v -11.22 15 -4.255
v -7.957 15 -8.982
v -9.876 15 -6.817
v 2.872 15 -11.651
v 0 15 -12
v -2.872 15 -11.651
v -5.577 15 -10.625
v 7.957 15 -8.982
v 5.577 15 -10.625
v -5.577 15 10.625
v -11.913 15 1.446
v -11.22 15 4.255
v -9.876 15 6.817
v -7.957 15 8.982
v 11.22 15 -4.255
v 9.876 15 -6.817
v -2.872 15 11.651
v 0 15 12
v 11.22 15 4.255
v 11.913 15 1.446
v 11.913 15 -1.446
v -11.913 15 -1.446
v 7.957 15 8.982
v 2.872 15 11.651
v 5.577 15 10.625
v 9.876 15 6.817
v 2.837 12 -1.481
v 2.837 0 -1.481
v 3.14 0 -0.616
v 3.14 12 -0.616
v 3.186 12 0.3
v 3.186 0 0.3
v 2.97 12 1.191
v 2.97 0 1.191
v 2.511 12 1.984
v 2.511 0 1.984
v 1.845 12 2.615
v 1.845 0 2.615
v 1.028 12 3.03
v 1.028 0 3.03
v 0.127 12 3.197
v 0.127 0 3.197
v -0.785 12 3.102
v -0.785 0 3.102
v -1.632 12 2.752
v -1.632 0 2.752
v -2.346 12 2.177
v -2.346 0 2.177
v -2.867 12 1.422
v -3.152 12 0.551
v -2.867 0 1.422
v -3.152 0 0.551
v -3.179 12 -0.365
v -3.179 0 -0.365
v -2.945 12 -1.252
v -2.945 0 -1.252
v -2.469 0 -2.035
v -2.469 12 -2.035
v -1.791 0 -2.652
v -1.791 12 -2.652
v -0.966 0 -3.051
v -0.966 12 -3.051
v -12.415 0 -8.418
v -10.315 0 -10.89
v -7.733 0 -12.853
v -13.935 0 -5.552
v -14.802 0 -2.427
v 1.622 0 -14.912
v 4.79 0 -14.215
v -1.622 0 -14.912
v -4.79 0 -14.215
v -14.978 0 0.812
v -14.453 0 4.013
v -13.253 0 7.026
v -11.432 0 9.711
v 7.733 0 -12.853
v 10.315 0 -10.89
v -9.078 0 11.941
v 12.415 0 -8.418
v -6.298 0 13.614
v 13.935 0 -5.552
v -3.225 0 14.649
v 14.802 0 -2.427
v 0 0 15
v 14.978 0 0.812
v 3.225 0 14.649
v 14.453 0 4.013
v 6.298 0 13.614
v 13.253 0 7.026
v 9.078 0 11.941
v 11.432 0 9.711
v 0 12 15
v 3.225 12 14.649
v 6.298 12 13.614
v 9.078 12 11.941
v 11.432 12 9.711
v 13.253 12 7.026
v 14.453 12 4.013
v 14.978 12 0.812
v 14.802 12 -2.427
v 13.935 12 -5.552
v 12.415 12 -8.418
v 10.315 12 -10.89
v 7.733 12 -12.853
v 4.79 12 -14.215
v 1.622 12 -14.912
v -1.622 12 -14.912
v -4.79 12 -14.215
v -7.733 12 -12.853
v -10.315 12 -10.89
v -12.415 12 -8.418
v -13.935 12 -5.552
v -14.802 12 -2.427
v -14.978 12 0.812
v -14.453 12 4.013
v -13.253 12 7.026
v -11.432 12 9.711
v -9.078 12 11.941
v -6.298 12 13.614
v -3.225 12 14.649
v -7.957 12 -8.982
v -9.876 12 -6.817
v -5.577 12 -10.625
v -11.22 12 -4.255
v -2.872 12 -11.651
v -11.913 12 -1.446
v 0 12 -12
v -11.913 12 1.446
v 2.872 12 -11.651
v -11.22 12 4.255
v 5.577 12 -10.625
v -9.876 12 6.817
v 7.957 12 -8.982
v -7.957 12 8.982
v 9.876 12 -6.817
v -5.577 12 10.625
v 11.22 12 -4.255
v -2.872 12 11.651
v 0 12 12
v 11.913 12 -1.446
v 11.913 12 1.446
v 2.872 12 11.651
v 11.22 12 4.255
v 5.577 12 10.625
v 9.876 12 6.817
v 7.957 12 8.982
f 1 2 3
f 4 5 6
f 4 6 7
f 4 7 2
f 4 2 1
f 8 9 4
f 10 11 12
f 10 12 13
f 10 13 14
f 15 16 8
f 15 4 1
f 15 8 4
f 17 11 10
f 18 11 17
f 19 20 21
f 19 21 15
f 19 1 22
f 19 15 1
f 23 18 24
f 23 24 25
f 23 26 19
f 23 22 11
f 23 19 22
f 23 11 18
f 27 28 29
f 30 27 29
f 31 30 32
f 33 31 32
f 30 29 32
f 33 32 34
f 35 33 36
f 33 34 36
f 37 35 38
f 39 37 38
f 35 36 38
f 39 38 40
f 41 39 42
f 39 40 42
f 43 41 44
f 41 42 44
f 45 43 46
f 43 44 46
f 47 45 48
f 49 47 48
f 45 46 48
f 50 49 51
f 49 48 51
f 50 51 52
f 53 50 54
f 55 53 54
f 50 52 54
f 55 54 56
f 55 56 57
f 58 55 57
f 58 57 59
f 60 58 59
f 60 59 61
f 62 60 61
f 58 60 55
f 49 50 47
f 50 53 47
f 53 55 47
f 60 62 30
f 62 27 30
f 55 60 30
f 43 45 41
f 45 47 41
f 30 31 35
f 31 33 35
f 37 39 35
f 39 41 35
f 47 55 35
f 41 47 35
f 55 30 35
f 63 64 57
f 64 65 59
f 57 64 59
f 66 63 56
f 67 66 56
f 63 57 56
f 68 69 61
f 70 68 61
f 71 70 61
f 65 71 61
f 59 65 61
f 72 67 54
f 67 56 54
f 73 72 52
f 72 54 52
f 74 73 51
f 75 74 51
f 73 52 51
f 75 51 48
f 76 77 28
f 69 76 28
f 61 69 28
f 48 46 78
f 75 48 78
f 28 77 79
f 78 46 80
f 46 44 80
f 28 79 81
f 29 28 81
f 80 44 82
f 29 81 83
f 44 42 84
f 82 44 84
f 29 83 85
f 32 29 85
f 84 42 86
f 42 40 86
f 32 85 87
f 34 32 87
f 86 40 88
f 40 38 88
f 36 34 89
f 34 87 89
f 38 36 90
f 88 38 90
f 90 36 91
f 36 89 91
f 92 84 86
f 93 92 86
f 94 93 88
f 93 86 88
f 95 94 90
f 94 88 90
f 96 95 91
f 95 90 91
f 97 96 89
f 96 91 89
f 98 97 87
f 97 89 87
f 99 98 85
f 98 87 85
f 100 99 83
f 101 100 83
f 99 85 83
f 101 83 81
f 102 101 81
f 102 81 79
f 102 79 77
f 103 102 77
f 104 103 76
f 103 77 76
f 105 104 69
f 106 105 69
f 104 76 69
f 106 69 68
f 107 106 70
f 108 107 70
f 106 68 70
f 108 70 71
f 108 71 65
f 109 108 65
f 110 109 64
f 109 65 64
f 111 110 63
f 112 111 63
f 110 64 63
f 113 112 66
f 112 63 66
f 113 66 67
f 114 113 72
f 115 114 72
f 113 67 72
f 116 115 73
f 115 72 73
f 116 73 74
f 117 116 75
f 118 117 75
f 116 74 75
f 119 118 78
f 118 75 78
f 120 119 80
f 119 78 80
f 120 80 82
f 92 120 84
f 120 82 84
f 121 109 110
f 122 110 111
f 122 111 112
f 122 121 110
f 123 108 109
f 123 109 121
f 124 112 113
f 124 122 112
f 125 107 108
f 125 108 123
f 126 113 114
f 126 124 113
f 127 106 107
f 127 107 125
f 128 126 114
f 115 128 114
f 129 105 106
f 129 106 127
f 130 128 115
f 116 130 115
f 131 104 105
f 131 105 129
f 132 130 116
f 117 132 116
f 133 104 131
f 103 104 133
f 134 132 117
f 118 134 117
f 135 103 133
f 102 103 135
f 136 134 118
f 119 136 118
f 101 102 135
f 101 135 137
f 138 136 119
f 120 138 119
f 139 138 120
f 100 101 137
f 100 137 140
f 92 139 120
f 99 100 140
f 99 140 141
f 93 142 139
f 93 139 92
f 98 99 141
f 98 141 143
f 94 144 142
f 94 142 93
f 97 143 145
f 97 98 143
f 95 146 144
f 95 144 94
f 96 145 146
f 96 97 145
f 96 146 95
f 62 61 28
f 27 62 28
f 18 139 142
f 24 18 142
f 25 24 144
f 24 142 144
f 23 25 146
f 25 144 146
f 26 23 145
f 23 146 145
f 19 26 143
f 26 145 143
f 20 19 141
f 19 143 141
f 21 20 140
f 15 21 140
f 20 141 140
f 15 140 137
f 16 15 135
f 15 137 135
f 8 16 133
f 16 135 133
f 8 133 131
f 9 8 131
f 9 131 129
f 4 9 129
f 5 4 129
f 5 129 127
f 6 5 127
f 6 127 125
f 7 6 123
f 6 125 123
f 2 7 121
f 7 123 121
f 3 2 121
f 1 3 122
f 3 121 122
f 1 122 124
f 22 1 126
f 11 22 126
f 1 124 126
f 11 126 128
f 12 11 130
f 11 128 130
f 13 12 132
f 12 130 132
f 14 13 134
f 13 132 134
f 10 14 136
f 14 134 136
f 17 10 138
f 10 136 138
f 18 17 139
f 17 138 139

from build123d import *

# Parameters (mm, degrees)
SKETCH1_R           = 15
BOSS_EXTRUDE1_DEPTH = 12
SKETCH2_R           = 12
BOSS_EXTRUDE2_DEPTH = 3


with BuildPart() as part:
    # Sketch1 → Boss-Extrude1 (new body)
    with BuildSketch(Plane(origin=(0, 0, 0), x_dir=(1, 0, 0), z_dir=(0, 1, 0))):
        with Locations(Location((0, 0, 0), (0, 0, 270))):
            Circle(SKETCH1_R)
        with BuildLine():
            Line((-0.965663189, 3.050818678), (2.836784234, 1.480761699))
            ThreePointArc((2.836784234, 1.480761699), (-1.221287526, -2.957779028), (-0.965663189, 3.050818678))
        make_face(mode=Mode.SUBTRACT)
    extrude(amount=BOSS_EXTRUDE1_DEPTH)

    # Sketch2 → Boss-Extrude2 (add)
    with BuildSketch(Plane(origin=(0, 12, 0), x_dir=(1, 0, 0), z_dir=(0, 1, 0))):
        with Locations(Location((0, 0, 0), (0, 0, 270))):
            Circle(SKETCH2_R)
    extrude(amount=BOSS_EXTRUDE2_DEPTH)


solid = part.part
